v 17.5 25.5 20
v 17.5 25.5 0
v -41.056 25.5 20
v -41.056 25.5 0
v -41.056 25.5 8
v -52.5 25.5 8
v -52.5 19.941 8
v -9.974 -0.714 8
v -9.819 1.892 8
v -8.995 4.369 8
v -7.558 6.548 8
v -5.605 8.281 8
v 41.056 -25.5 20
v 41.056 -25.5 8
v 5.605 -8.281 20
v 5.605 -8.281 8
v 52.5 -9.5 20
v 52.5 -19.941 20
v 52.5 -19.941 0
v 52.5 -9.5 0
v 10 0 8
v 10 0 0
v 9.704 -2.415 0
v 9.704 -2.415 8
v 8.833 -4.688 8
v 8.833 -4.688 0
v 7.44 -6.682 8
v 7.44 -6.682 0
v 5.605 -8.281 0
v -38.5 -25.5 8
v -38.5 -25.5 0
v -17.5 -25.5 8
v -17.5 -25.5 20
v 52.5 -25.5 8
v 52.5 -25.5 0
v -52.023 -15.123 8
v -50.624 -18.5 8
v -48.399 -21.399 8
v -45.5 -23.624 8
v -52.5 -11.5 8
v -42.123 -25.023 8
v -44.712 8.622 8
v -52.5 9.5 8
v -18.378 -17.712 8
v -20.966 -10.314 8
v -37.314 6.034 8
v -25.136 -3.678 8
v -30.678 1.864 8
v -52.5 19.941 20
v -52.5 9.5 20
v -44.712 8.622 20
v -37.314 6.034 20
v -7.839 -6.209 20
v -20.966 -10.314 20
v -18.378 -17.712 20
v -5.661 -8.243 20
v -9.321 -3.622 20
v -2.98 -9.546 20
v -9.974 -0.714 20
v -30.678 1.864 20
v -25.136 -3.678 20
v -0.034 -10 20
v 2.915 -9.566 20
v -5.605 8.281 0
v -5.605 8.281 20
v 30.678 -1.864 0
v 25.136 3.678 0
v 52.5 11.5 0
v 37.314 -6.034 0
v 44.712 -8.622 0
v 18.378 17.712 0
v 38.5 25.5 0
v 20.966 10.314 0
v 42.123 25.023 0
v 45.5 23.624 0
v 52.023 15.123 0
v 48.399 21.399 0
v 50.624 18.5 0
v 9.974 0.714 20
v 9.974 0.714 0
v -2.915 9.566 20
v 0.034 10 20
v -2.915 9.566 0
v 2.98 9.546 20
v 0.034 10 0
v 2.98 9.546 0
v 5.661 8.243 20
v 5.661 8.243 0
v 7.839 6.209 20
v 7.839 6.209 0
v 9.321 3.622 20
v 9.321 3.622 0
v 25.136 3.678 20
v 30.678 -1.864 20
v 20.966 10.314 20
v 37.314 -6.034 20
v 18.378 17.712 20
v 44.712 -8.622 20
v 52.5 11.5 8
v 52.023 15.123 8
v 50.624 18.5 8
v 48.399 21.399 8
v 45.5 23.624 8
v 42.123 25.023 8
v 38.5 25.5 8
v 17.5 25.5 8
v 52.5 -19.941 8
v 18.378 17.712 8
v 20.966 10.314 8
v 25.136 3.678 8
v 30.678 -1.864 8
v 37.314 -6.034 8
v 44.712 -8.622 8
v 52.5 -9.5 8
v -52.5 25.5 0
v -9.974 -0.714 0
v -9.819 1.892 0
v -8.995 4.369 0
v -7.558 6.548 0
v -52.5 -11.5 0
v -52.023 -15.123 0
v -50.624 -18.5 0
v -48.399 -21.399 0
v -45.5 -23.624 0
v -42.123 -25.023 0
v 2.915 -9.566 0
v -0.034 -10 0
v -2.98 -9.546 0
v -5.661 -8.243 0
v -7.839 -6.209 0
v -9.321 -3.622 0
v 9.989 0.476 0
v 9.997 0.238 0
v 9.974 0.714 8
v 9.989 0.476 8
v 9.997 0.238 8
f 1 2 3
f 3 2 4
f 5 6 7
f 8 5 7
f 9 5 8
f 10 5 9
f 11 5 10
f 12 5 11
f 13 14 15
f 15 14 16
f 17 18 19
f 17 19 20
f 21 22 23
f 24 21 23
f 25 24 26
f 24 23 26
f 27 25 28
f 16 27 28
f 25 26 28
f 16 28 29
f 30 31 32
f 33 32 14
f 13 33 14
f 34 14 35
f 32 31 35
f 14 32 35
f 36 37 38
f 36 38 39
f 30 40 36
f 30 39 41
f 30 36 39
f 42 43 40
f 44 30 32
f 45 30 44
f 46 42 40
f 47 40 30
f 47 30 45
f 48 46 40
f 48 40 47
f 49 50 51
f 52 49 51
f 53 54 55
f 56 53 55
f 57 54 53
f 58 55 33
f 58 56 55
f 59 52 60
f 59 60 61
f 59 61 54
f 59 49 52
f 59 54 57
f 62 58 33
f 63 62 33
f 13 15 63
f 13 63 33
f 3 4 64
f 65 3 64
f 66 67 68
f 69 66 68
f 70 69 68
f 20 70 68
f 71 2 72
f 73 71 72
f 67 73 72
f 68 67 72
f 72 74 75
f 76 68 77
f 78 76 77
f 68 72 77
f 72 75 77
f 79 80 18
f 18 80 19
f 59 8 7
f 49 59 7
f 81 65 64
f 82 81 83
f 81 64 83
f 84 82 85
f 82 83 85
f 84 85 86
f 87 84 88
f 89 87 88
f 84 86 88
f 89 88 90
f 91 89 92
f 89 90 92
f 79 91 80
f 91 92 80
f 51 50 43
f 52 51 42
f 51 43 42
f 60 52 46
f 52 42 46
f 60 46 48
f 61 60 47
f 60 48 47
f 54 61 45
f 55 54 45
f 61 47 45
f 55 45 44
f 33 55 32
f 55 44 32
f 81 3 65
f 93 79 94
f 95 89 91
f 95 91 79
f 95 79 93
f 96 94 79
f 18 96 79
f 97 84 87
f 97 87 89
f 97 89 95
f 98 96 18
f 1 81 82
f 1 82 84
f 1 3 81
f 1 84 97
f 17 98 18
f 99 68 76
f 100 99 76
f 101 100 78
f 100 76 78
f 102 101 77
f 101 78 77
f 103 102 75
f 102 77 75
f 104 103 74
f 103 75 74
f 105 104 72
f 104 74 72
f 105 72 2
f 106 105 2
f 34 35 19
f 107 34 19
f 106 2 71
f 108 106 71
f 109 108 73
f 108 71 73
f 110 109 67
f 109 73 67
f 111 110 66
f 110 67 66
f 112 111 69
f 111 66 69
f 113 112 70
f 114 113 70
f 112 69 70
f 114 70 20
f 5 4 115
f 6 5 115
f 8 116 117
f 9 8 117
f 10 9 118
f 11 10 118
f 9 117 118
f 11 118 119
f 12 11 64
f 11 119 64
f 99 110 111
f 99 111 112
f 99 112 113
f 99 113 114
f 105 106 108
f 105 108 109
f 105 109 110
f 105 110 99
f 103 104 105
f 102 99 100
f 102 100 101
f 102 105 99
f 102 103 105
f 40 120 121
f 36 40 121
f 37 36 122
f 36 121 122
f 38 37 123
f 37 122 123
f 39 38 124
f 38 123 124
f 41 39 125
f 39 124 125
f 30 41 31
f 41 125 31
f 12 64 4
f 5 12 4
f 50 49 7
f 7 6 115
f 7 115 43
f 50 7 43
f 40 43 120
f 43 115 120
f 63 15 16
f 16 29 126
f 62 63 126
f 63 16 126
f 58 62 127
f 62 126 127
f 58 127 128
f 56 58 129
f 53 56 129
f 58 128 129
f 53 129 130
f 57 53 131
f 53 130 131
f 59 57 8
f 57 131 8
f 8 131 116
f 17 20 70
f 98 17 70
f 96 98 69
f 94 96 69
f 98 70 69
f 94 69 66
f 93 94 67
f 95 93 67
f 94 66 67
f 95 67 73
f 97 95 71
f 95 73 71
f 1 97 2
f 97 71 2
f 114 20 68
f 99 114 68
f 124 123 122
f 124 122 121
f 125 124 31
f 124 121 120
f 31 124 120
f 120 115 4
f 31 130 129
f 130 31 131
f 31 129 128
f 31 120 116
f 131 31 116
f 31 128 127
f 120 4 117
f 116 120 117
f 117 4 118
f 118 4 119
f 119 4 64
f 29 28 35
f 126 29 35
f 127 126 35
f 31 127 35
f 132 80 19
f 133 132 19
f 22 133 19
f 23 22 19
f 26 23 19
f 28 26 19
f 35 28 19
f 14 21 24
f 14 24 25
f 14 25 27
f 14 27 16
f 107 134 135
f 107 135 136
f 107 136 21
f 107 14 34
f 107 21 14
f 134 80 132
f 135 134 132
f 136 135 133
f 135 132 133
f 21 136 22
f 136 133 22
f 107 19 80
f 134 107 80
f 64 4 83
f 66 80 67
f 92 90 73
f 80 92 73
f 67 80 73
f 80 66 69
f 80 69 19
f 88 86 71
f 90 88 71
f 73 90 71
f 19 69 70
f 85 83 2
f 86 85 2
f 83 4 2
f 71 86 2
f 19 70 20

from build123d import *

# Parameters (mm, degrees)
BOSS_EXTRUDE1_DEPTH   = 20
BOSS_EXTRUDE1_2_DEPTH = 20
BOSS_EXTRUDE2_DEPTH   = 8


with BuildPart() as part:
    # Sketch1 → Boss-Extrude1 (new body)
    with BuildSketch(Plane.XY):
        with BuildLine():
            Line((17.5, 25.5), (-41.055837377, 25.5))
            Line((-41.055837377, 25.5), (-5.605449349, 8.2812401))
            ThreePointArc((-5.605449349, 8.2812401), (4.369039627, 8.995081586), (9.974488976, 0.713841485))
            Line((9.974488976, 0.713841485), (52.5, -19.941406726))
            Line((52.5, -19.941406726), (52.5, -9.5))
            ThreePointArc((52.5, -9.5), (27.751262658, 0.751262658), (17.5, 25.5))
        make_face()
    extrude(amount=BOSS_EXTRUDE1_DEPTH)


with BuildPart() as body_2:
    # Sketch1 → Boss-Extrude1 2 (new body)
    with BuildSketch(Plane.XY):
        with BuildLine():
            ThreePointArc((5.605449349, -8.2812401), (-4.369039627, -8.995081586), (-9.974488976, -0.713841485))
            Line((-9.974488976, -0.713841485), (-52.5, 19.941406726))
            Line((-52.5, 19.941406726), (-52.5, 9.5))
            ThreePointArc((-52.5, 9.5), (-27.751262658, -0.751262658), (-17.5, -25.5))
            Line((-17.5, -25.5), (41.055837377, -25.5))
            Line((41.055837377, -25.5), (5.605449349, -8.2812401))
        make_face()
    extrude(amount=BOSS_EXTRUDE1_2_DEPTH)

    # Sketch1<3> → Boss-Extrude2 (add)
    with BuildSketch(Plane.XY):
        with BuildLine():
            Line((-5.605449349, 8.2812401), (-41.055837377, 25.5))
            Line((-41.055837377, 25.5), (-52.5, 25.5))
            Line((-52.5, 25.5), (-52.5, 19.941406726))
            Line((-52.5, 19.941406726), (-9.974488976, -0.713841485))
            ThreePointArc((-9.974488976, -0.713841485), (-8.995081586, 4.369039627), (-5.605449349, 8.2812401))
        make_face()
        with BuildLine():
            Line((38.5, 25.5), (17.5, 25.5))
            ThreePointArc((17.5, 25.5), (27.751262658, 0.751262658), (52.5, -9.5))
            Line((52.5, -9.5), (52.5, 11.5))
            ThreePointArc((52.5, 11.5), (48.399494937, 21.399494937), (38.5, 25.5))
        make_face()
        with BuildLine():
            Line((52.5, -19.941406726), (9.974488976, 0.713841485))
            ThreePointArc((9.974488976, 0.713841485), (8.995081586, -4.369039627), (5.605449349, -8.2812401))
            Line((5.605449349, -8.2812401), (41.055837377, -25.5))
            Line((41.055837377, -25.5), (52.5, -25.5))
            Line((52.5, -25.5), (52.5, -19.941406726))
        make_face()
        with BuildLine():
            ThreePointArc((-17.5, -25.5), (-27.751262658, -0.751262658), (-52.5, 9.5))
            Line((-52.5, 9.5), (-52.5, -11.5))
            ThreePointArc((-52.5, -11.5), (-48.399494937, -21.399494937), (-38.5, -25.5))
            Line((-38.5, -25.5), (-17.5, -25.5))
        make_face()
    extrude(amount=BOSS_EXTRUDE2_DEPTH)


with BuildPart() as boss_extrude2_piece_1:
    # of the separate pieces the step leaves, piece 1, a body of its own (boss_extrude2_pieces)
    add(body_2.part.solids().sort_by_distance((5.605449349, -8.2812401, 8))[0])


with BuildPart() as boss_extrude2_piece_2:
    # of the separate pieces the step leaves, piece 2, a body of its own (boss_extrude2_pieces)
    add(body_2.part.solids().sort_by_distance((52.5, -9.5, 0))[0])


solid = Compound([part.part, boss_extrude2_piece_1.part, boss_extrude2_piece_2.part])
